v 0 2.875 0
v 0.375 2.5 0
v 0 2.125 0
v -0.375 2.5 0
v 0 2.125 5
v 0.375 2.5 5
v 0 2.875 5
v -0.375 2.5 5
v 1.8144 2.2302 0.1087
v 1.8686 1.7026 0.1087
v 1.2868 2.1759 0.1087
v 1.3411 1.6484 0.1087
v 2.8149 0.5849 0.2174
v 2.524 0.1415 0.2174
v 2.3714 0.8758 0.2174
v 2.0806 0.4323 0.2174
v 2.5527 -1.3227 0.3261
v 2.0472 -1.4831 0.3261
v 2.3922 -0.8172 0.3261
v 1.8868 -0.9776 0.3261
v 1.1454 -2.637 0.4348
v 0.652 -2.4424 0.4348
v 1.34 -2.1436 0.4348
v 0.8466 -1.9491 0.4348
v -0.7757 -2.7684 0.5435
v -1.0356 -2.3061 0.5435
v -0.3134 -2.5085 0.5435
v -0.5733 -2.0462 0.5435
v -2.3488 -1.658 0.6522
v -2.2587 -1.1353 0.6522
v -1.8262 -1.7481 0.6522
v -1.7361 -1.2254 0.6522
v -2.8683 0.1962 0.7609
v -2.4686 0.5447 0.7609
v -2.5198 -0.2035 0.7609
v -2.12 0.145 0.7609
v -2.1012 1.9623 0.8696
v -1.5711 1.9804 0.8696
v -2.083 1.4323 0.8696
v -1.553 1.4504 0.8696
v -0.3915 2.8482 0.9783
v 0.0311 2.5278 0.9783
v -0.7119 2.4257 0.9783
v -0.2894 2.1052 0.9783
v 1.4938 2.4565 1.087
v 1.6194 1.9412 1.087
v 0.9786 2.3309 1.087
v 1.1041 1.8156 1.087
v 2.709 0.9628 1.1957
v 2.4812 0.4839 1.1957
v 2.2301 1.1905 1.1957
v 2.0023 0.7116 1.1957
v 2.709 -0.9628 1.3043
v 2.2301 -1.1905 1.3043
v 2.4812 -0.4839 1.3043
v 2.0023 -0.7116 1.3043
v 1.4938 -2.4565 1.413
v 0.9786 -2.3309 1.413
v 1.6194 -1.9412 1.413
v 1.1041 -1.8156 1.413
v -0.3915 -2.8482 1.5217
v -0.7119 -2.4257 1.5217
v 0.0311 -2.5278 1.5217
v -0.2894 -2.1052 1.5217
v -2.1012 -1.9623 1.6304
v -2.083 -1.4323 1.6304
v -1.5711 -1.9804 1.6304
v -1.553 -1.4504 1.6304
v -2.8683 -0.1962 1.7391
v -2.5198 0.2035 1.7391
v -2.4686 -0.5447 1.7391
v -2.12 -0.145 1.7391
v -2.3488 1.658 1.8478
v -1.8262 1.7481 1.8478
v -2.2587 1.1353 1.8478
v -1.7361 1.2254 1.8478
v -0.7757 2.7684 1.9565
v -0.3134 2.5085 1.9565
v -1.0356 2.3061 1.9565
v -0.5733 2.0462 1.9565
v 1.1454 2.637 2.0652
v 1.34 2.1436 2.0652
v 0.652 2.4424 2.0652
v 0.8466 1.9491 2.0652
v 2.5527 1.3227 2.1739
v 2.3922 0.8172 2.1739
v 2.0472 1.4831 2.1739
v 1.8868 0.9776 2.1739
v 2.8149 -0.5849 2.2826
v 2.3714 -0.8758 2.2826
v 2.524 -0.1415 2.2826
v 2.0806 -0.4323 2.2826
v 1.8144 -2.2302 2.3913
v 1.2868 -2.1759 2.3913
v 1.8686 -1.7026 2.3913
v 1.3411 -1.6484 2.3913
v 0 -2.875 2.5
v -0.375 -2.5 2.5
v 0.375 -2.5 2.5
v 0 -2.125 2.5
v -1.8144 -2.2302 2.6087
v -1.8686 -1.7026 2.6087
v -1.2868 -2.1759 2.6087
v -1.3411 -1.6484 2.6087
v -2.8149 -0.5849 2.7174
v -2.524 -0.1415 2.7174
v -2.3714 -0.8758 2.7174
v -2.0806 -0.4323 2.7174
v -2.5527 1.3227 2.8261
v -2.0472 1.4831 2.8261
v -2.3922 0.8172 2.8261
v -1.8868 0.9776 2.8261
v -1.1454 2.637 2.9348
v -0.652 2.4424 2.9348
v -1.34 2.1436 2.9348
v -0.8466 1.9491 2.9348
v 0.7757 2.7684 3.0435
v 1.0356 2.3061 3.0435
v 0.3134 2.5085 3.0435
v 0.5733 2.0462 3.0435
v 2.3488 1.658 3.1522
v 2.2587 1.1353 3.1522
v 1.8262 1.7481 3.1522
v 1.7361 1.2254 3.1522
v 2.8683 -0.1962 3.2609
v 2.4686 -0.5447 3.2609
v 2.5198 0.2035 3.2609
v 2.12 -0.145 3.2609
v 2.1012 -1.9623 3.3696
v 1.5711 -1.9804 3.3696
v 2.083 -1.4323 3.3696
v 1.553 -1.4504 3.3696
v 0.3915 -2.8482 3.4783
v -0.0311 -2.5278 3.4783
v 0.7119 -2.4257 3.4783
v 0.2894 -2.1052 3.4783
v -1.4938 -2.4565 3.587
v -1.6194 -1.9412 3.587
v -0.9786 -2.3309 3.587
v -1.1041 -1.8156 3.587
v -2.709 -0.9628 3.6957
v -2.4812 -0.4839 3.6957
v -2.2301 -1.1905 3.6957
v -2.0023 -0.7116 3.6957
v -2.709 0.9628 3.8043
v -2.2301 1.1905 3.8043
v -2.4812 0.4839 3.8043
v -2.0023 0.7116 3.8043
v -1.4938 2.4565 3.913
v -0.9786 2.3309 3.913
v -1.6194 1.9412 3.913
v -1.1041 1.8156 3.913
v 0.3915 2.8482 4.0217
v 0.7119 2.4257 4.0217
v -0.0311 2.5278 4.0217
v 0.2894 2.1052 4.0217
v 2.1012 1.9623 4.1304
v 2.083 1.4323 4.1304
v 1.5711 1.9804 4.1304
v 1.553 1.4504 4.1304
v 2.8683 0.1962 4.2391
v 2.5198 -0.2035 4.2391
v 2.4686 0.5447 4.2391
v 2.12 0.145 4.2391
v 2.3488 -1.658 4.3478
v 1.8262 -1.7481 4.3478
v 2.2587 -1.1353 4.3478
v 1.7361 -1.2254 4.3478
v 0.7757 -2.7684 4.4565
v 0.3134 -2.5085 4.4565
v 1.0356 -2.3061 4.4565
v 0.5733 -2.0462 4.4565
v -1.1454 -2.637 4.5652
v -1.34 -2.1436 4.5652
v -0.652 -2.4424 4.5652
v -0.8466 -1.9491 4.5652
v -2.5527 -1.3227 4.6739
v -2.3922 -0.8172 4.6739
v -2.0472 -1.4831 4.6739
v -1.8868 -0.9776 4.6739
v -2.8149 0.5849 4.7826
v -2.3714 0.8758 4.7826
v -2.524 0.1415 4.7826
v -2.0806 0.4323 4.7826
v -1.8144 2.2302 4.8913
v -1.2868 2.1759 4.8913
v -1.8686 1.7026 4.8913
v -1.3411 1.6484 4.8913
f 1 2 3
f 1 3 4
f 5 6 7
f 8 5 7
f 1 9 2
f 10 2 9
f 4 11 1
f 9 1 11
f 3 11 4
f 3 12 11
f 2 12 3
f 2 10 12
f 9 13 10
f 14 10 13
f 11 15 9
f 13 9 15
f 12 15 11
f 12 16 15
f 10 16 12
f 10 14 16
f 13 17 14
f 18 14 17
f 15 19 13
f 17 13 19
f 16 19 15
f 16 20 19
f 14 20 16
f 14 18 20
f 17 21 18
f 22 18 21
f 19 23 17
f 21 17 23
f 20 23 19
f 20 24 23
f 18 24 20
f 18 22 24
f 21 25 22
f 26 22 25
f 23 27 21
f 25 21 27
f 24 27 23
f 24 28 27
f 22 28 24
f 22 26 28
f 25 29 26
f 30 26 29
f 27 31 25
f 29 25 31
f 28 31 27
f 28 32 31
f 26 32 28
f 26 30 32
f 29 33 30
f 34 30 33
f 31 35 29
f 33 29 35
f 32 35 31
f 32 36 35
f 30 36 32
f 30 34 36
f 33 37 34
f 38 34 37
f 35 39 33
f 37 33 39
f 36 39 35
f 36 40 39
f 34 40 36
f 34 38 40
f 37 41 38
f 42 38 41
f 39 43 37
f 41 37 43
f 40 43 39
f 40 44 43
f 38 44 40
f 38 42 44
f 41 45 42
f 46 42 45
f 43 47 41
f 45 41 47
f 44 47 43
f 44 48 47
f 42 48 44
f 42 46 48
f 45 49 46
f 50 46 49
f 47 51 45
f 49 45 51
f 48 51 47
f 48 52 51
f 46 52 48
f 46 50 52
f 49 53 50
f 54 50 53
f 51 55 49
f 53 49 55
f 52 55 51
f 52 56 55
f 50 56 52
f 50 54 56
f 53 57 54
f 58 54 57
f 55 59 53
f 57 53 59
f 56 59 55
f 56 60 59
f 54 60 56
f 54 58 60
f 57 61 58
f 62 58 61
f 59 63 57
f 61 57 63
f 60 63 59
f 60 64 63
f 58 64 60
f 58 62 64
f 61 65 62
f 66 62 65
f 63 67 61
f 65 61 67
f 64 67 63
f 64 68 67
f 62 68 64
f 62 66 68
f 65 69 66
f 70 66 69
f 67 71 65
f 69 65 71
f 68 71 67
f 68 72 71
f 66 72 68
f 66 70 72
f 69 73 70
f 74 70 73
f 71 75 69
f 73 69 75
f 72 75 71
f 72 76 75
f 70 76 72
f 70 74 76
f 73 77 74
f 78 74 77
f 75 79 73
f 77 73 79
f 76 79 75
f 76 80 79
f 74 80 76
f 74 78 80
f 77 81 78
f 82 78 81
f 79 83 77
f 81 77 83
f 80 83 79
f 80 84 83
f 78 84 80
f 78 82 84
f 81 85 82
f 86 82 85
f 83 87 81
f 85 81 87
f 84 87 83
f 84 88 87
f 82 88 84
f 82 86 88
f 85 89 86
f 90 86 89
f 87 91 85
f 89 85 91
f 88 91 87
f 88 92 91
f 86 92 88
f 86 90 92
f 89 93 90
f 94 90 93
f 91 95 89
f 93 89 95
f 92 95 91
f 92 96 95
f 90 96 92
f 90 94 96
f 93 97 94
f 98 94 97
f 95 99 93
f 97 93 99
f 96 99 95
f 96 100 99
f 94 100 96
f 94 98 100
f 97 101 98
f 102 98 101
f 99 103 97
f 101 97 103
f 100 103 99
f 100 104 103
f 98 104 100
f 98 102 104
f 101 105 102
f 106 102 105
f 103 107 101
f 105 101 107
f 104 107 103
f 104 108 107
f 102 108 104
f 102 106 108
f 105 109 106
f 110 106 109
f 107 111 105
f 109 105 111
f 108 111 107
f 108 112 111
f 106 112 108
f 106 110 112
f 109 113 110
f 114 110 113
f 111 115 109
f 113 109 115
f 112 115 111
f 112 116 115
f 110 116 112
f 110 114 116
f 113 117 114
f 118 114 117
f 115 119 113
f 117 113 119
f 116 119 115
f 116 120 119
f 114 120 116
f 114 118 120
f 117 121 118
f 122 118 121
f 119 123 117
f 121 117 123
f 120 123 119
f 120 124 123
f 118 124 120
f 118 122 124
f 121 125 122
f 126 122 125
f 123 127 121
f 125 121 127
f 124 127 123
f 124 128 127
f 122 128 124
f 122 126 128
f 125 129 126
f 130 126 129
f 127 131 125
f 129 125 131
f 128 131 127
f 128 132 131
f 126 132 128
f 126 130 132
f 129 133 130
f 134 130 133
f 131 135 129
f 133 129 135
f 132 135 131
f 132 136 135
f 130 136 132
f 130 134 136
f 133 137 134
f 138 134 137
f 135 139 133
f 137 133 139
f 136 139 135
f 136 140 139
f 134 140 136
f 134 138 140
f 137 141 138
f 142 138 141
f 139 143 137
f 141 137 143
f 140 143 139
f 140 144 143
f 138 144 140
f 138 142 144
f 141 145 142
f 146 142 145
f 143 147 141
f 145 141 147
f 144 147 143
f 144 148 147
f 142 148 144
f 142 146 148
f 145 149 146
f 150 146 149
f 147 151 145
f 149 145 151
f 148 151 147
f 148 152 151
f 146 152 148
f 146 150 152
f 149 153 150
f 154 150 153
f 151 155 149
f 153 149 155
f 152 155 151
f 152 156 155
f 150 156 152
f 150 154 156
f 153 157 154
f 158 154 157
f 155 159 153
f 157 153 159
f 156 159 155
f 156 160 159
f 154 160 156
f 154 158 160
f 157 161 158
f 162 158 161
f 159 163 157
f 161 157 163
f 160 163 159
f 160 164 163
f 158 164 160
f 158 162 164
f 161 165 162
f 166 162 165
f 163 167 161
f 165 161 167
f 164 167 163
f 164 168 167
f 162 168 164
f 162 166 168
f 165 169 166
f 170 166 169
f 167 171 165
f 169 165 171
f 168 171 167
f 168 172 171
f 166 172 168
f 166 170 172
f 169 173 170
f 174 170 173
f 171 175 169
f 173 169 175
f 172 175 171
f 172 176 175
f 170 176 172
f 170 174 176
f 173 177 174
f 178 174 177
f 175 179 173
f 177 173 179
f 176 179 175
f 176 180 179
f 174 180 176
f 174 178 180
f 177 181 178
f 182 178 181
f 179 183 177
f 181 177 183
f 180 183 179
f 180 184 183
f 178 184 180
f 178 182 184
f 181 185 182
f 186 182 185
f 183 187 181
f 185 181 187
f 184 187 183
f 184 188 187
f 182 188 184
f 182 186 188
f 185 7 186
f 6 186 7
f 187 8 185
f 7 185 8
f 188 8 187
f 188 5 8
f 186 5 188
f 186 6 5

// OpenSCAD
linear_extrude(5, twist = 360 * 5)


  translate([0, 2.5, 0])
    rotate([0, 0, 0])
    circle(d=0.75, $fn = 4);
